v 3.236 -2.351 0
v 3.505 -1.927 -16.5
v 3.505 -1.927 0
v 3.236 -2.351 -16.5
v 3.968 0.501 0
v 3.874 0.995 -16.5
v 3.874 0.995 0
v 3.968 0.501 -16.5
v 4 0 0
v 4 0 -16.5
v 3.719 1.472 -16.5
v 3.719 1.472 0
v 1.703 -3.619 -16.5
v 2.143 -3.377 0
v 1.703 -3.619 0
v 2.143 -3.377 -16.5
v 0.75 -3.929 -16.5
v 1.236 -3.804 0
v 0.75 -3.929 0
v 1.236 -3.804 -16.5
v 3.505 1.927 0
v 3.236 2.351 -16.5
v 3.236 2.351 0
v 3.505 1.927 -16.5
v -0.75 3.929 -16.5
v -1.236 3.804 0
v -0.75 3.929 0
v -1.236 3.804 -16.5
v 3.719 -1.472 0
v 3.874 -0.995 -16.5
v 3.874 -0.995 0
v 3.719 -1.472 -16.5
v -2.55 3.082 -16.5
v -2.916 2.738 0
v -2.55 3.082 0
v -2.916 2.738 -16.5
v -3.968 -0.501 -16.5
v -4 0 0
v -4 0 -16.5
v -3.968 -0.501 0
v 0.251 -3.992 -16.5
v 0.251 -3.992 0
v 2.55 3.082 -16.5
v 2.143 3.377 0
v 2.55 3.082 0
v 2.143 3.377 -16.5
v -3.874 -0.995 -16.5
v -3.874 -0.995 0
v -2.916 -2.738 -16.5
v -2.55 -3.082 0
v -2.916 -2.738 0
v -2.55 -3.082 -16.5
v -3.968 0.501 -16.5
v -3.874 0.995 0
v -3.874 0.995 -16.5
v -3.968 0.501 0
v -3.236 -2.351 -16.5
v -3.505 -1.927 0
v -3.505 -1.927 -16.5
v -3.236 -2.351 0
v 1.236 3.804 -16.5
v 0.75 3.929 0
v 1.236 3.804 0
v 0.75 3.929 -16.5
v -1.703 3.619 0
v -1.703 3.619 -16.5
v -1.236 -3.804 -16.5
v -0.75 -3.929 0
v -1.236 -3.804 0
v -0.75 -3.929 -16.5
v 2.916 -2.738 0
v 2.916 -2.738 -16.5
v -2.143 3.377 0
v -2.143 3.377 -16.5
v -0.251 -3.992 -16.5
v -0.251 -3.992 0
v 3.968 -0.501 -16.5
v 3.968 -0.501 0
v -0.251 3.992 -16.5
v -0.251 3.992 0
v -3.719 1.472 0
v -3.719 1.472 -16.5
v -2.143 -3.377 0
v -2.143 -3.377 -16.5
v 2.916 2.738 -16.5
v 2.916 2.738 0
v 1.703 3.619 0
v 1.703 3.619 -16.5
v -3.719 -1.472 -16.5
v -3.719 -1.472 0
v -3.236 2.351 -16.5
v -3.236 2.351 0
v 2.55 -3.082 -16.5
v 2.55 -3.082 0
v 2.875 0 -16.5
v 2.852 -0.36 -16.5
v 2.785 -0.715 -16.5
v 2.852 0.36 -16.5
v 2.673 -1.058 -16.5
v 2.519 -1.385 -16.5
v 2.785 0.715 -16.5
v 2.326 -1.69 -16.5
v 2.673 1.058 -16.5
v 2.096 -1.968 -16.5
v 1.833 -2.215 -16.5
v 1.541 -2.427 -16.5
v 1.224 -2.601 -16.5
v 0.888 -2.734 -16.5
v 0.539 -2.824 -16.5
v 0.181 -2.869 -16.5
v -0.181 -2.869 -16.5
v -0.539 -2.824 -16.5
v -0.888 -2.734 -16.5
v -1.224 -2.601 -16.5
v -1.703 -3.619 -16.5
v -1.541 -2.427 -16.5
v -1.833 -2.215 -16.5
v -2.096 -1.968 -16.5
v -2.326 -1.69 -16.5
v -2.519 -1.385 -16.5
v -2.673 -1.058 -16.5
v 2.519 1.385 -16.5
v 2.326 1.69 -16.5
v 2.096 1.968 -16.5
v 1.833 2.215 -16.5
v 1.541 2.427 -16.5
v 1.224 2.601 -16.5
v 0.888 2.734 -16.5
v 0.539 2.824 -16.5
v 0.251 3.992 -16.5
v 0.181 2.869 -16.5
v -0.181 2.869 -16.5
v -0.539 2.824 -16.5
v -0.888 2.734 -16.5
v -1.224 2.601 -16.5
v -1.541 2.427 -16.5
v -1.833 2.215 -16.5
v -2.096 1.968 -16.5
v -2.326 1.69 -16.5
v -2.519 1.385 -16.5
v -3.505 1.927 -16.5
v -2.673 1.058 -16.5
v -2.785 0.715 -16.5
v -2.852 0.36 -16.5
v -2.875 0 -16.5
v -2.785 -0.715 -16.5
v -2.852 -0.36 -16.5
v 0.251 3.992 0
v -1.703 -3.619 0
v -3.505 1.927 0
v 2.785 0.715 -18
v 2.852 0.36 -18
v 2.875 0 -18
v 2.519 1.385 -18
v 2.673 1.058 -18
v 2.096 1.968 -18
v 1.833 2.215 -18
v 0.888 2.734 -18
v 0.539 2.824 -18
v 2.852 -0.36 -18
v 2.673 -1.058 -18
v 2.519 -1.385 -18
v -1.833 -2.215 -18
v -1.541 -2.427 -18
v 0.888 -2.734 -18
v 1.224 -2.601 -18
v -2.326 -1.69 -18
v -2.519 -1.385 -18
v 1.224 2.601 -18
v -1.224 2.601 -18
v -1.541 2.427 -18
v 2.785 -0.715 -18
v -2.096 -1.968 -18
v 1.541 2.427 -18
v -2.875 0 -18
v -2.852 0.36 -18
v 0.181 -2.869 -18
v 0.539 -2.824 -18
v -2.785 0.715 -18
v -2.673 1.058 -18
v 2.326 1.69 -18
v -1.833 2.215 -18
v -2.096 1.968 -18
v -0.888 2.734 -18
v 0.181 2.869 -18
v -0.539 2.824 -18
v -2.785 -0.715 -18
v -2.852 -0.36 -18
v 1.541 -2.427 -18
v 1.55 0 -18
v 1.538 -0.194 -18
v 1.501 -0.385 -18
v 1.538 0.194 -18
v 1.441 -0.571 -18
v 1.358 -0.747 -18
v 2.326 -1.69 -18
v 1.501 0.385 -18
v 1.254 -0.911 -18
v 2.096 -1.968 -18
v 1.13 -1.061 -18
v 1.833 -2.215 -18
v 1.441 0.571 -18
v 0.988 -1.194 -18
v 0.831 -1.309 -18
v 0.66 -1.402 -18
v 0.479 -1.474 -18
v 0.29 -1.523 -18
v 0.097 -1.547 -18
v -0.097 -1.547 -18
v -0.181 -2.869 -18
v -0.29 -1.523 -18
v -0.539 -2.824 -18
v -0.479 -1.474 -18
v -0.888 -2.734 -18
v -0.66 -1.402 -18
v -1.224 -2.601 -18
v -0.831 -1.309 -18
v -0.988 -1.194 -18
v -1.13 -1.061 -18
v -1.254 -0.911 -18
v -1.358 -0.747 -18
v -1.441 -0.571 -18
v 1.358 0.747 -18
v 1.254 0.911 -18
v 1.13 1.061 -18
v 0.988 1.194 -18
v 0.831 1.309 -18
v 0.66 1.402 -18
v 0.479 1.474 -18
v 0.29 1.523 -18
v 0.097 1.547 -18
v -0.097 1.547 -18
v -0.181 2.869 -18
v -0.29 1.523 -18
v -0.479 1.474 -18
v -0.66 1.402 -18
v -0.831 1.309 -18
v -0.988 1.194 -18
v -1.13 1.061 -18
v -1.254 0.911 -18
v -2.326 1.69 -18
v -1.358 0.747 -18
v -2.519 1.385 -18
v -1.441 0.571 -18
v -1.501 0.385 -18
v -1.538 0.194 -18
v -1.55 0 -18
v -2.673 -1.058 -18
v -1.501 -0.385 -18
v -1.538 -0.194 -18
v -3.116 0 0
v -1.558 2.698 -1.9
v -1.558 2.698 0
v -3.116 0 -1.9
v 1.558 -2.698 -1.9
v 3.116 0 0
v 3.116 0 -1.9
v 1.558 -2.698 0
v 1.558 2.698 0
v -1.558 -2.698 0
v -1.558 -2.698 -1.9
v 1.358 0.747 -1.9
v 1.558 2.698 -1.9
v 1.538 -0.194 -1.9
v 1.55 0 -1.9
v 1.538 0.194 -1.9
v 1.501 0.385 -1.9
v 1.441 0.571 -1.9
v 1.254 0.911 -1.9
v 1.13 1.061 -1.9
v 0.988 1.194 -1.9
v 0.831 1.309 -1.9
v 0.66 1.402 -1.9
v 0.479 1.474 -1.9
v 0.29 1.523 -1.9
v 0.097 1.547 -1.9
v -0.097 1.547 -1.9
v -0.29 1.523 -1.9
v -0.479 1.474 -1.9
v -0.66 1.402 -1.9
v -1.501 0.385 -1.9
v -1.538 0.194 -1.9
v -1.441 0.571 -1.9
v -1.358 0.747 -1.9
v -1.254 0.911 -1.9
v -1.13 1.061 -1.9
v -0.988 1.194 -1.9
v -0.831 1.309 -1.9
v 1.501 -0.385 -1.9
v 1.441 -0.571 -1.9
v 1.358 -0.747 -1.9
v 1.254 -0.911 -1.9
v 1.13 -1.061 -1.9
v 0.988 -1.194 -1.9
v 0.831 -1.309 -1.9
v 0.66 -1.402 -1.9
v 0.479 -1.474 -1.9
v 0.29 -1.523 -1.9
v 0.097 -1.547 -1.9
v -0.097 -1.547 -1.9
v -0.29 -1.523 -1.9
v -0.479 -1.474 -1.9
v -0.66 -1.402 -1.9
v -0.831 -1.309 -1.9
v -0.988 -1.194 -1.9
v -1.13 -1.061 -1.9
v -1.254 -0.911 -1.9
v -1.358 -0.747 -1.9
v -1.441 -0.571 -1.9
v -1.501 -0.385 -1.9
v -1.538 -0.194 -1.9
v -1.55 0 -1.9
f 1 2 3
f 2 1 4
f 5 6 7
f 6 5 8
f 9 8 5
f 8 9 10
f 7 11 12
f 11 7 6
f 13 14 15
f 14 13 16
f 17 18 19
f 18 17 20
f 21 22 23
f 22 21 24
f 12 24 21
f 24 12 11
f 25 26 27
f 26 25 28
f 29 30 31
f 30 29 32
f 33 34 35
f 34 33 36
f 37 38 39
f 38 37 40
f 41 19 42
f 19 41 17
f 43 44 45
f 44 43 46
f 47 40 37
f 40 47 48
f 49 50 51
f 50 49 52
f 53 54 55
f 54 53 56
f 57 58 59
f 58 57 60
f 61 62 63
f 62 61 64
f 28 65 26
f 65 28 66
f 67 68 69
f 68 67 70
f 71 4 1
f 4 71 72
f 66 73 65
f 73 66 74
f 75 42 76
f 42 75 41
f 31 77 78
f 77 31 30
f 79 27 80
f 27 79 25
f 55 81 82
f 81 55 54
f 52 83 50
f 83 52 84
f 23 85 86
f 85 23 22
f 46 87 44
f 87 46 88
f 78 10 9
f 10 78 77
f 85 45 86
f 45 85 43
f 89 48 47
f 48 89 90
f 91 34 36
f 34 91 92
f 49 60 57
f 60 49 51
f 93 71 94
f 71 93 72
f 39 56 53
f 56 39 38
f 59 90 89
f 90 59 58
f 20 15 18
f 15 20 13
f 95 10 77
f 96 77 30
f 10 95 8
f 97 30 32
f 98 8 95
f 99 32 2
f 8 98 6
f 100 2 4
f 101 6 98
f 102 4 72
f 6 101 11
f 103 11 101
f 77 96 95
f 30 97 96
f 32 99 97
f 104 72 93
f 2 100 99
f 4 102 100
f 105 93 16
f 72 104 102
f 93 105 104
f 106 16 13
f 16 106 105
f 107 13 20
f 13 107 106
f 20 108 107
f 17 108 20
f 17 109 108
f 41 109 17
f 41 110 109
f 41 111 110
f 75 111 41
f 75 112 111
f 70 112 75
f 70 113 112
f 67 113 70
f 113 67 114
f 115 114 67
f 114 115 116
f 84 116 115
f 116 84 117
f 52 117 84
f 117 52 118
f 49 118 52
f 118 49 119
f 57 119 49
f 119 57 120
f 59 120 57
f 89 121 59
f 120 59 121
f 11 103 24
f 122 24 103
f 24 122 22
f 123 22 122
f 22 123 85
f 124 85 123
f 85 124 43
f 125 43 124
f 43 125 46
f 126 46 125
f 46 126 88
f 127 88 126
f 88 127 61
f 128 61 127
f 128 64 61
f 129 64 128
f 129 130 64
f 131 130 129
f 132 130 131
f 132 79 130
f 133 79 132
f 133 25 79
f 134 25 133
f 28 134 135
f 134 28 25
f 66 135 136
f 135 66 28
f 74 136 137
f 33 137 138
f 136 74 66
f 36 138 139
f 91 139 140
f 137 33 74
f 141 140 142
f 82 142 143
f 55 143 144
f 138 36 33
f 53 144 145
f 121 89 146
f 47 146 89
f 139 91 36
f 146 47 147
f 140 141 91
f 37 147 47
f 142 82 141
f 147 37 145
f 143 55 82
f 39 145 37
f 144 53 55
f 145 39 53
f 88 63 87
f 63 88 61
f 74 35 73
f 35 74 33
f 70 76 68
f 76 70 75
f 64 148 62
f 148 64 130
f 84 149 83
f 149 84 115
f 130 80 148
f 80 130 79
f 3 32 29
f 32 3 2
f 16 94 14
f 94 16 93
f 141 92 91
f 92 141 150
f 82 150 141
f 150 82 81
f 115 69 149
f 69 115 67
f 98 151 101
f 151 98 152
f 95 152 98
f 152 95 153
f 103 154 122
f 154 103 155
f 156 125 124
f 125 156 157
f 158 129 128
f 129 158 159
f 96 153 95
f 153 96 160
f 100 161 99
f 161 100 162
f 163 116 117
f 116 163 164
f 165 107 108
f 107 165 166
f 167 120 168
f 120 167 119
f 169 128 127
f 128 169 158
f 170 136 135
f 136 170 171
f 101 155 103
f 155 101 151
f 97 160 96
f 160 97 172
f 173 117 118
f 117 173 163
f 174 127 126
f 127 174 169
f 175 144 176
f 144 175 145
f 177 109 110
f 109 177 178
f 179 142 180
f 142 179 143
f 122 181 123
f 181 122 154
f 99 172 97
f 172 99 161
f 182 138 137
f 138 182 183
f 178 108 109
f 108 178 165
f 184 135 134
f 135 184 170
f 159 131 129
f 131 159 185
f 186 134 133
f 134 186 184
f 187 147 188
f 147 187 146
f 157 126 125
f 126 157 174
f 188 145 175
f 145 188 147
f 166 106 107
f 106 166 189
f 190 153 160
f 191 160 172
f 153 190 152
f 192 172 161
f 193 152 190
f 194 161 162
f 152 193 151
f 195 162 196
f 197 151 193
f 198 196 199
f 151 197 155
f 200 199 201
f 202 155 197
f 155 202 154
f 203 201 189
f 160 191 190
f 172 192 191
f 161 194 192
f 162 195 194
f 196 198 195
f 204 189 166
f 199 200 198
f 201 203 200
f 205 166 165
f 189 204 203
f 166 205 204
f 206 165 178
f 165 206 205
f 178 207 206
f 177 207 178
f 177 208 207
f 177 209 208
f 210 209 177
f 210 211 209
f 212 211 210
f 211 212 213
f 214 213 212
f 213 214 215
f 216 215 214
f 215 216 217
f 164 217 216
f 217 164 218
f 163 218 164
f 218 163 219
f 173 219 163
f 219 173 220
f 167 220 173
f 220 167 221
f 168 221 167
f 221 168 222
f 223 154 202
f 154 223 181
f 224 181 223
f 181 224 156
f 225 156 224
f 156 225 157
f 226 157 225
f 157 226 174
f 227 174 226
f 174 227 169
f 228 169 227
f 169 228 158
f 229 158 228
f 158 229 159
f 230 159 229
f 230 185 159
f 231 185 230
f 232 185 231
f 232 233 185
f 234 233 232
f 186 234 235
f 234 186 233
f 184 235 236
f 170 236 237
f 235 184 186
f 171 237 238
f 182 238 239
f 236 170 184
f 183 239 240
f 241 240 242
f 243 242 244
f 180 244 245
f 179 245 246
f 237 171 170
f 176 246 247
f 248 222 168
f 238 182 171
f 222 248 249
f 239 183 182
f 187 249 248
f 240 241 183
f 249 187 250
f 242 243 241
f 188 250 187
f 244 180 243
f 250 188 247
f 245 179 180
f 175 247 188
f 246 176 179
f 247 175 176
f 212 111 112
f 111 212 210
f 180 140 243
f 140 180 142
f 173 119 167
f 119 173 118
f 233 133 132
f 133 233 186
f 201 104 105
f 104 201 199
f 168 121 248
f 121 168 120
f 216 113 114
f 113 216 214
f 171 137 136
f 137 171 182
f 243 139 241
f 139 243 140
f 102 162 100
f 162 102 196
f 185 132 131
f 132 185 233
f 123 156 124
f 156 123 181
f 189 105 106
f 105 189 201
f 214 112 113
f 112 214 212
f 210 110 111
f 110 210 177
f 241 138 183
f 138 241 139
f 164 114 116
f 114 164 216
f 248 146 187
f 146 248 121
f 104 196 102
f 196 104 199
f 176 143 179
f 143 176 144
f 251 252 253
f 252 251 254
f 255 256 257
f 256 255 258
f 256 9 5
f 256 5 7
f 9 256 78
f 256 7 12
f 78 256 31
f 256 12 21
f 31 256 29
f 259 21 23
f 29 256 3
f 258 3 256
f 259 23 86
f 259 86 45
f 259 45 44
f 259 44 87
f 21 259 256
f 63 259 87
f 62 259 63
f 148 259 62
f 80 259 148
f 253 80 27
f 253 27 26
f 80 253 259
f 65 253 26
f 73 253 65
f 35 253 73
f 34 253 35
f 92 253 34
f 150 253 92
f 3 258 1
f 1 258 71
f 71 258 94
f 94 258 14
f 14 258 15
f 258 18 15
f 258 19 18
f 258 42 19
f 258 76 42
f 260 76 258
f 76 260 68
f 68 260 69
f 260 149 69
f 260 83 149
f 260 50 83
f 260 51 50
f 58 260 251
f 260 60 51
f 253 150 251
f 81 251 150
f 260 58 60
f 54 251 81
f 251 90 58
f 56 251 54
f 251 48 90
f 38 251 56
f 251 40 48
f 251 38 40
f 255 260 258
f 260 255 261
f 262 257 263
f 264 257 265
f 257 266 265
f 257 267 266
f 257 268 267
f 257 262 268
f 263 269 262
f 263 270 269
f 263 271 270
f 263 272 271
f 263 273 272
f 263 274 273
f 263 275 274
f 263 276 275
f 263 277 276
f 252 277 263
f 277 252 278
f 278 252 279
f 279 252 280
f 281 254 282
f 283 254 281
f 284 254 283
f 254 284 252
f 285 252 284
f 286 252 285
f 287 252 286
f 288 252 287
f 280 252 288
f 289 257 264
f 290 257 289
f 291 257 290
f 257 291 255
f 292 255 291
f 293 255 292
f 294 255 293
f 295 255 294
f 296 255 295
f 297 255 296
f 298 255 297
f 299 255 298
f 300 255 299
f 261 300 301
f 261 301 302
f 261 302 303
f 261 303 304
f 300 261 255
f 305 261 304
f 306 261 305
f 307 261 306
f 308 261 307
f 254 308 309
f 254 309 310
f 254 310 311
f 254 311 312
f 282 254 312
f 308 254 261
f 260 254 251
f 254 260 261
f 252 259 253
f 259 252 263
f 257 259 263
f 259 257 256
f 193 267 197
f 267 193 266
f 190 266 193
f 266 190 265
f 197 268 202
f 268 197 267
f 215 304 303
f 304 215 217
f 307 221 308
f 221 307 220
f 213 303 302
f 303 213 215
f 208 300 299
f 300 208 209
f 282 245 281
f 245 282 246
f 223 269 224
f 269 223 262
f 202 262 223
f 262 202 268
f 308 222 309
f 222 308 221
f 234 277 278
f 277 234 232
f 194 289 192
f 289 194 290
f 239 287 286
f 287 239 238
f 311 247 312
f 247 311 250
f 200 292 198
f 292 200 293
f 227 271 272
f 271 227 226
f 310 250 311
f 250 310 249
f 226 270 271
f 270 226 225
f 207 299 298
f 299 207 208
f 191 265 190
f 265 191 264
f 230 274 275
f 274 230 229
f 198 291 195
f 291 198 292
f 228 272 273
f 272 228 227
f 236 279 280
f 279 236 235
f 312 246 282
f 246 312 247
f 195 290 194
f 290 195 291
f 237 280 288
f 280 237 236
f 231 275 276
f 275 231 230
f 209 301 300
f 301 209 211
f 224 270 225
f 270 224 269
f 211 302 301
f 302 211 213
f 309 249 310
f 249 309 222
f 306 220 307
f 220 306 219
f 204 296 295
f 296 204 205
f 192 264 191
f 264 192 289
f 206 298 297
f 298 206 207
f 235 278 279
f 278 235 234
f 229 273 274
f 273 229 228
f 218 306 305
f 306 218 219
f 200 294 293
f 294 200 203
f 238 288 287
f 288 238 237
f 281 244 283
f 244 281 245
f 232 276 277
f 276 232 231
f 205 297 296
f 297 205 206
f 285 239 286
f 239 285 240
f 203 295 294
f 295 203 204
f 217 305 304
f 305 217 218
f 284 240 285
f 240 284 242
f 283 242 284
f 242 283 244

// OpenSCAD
$fn = 50;

difference() {
	union() {
		translate(v = [0, 0, -16.5]) {
			cylinder(h = 19.5, r = 4.0);
		}
		#translate(v = [0, 0, -18.0]) {
			cylinder(h = 18, r = 2.875);
		}
	}
	union() {
		translate(v = [0, 0, 0]) {
			rotate(a = [0, 0, 0]) {
				difference() {
					union() {
						translate(v = [0, 0, -1.9]) {
							linear_extrude(height = 1.9) {
								polygon(points = [[3.1158, 0.0], [1.5579000000000005, 2.698361953111554], [-1.5578999999999994, 2.6983619531115544], [-3.1158, 3.815754496783323e-16], [-1.5579000000000014, -2.6983619531115535], [1.557899999999998, -2.6983619531115552]]);
							}
						}
					}
					union();
				}
			}
		}
		#cylinder(h = 3, r = 5.0);
		#translate(v = [0, 0, -100.0]) {
			cylinder(h = 200, r = 1.55);
		}
	}
}
